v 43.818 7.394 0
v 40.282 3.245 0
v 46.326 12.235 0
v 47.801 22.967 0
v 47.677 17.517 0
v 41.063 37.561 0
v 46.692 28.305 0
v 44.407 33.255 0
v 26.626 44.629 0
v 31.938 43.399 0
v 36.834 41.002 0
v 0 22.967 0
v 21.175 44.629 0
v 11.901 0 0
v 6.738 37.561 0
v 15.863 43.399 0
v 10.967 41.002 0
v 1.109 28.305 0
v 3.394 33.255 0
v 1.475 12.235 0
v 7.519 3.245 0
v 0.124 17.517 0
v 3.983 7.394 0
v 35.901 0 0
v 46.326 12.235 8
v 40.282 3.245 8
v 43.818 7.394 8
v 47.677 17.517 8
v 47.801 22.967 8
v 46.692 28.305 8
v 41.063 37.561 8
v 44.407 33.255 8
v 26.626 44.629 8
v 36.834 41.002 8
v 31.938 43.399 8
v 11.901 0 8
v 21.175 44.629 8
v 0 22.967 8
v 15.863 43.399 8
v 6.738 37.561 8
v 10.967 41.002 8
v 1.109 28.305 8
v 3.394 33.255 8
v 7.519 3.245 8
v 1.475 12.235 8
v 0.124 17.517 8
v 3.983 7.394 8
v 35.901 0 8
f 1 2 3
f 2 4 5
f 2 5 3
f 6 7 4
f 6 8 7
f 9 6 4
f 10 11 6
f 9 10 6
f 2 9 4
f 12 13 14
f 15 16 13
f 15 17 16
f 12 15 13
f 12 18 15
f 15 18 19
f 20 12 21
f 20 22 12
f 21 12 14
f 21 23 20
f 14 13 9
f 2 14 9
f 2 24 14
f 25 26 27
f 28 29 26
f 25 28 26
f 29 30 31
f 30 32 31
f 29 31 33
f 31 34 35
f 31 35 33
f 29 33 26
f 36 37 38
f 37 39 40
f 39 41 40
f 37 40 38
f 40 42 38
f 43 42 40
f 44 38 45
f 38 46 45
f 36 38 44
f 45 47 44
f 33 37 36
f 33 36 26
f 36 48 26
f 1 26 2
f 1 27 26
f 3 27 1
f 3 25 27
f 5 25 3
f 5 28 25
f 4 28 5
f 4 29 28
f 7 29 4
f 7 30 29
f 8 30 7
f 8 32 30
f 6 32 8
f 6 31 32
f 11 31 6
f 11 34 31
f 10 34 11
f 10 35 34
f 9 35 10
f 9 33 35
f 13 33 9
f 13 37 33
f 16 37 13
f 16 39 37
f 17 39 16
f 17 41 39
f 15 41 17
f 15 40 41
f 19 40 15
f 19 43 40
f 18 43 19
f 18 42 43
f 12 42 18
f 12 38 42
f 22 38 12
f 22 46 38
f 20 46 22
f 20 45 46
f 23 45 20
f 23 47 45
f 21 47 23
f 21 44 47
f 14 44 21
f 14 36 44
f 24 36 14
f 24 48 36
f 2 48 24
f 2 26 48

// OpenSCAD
$fn = 32;

// ----------------------------------------------------------------------
// Flat adaptor: single_d, 8 mm thick
// ----------------------------------------------------------------------

// --- parameters (mm) ---
profile_height = 8;       // extrusion height
profile_points = 24;      // points of the closed outline

profile = [[35.901, 0], [40.282, 3.245], [43.818, 7.394], [46.326, 12.235], [47.677, 17.517], [47.801, 22.967], [46.692, 28.305], [44.407, 33.255], [41.063, 37.561], [36.834, 41.002], [31.938, 43.399], [26.626, 44.629], [21.175, 44.629], [15.863, 43.399], [10.967, 41.002], [6.738, 37.561], [3.394, 33.255], [1.109, 28.305], [0, 22.967], [0.124, 17.517], [1.475, 12.235], [3.983, 7.394], [7.519, 3.245], [11.901, 0]];  // single closed polygon, 24 points, counter clockwise

// --- the one profile operation ---
linear_extrude(height = profile_height) polygon(points = profile);
